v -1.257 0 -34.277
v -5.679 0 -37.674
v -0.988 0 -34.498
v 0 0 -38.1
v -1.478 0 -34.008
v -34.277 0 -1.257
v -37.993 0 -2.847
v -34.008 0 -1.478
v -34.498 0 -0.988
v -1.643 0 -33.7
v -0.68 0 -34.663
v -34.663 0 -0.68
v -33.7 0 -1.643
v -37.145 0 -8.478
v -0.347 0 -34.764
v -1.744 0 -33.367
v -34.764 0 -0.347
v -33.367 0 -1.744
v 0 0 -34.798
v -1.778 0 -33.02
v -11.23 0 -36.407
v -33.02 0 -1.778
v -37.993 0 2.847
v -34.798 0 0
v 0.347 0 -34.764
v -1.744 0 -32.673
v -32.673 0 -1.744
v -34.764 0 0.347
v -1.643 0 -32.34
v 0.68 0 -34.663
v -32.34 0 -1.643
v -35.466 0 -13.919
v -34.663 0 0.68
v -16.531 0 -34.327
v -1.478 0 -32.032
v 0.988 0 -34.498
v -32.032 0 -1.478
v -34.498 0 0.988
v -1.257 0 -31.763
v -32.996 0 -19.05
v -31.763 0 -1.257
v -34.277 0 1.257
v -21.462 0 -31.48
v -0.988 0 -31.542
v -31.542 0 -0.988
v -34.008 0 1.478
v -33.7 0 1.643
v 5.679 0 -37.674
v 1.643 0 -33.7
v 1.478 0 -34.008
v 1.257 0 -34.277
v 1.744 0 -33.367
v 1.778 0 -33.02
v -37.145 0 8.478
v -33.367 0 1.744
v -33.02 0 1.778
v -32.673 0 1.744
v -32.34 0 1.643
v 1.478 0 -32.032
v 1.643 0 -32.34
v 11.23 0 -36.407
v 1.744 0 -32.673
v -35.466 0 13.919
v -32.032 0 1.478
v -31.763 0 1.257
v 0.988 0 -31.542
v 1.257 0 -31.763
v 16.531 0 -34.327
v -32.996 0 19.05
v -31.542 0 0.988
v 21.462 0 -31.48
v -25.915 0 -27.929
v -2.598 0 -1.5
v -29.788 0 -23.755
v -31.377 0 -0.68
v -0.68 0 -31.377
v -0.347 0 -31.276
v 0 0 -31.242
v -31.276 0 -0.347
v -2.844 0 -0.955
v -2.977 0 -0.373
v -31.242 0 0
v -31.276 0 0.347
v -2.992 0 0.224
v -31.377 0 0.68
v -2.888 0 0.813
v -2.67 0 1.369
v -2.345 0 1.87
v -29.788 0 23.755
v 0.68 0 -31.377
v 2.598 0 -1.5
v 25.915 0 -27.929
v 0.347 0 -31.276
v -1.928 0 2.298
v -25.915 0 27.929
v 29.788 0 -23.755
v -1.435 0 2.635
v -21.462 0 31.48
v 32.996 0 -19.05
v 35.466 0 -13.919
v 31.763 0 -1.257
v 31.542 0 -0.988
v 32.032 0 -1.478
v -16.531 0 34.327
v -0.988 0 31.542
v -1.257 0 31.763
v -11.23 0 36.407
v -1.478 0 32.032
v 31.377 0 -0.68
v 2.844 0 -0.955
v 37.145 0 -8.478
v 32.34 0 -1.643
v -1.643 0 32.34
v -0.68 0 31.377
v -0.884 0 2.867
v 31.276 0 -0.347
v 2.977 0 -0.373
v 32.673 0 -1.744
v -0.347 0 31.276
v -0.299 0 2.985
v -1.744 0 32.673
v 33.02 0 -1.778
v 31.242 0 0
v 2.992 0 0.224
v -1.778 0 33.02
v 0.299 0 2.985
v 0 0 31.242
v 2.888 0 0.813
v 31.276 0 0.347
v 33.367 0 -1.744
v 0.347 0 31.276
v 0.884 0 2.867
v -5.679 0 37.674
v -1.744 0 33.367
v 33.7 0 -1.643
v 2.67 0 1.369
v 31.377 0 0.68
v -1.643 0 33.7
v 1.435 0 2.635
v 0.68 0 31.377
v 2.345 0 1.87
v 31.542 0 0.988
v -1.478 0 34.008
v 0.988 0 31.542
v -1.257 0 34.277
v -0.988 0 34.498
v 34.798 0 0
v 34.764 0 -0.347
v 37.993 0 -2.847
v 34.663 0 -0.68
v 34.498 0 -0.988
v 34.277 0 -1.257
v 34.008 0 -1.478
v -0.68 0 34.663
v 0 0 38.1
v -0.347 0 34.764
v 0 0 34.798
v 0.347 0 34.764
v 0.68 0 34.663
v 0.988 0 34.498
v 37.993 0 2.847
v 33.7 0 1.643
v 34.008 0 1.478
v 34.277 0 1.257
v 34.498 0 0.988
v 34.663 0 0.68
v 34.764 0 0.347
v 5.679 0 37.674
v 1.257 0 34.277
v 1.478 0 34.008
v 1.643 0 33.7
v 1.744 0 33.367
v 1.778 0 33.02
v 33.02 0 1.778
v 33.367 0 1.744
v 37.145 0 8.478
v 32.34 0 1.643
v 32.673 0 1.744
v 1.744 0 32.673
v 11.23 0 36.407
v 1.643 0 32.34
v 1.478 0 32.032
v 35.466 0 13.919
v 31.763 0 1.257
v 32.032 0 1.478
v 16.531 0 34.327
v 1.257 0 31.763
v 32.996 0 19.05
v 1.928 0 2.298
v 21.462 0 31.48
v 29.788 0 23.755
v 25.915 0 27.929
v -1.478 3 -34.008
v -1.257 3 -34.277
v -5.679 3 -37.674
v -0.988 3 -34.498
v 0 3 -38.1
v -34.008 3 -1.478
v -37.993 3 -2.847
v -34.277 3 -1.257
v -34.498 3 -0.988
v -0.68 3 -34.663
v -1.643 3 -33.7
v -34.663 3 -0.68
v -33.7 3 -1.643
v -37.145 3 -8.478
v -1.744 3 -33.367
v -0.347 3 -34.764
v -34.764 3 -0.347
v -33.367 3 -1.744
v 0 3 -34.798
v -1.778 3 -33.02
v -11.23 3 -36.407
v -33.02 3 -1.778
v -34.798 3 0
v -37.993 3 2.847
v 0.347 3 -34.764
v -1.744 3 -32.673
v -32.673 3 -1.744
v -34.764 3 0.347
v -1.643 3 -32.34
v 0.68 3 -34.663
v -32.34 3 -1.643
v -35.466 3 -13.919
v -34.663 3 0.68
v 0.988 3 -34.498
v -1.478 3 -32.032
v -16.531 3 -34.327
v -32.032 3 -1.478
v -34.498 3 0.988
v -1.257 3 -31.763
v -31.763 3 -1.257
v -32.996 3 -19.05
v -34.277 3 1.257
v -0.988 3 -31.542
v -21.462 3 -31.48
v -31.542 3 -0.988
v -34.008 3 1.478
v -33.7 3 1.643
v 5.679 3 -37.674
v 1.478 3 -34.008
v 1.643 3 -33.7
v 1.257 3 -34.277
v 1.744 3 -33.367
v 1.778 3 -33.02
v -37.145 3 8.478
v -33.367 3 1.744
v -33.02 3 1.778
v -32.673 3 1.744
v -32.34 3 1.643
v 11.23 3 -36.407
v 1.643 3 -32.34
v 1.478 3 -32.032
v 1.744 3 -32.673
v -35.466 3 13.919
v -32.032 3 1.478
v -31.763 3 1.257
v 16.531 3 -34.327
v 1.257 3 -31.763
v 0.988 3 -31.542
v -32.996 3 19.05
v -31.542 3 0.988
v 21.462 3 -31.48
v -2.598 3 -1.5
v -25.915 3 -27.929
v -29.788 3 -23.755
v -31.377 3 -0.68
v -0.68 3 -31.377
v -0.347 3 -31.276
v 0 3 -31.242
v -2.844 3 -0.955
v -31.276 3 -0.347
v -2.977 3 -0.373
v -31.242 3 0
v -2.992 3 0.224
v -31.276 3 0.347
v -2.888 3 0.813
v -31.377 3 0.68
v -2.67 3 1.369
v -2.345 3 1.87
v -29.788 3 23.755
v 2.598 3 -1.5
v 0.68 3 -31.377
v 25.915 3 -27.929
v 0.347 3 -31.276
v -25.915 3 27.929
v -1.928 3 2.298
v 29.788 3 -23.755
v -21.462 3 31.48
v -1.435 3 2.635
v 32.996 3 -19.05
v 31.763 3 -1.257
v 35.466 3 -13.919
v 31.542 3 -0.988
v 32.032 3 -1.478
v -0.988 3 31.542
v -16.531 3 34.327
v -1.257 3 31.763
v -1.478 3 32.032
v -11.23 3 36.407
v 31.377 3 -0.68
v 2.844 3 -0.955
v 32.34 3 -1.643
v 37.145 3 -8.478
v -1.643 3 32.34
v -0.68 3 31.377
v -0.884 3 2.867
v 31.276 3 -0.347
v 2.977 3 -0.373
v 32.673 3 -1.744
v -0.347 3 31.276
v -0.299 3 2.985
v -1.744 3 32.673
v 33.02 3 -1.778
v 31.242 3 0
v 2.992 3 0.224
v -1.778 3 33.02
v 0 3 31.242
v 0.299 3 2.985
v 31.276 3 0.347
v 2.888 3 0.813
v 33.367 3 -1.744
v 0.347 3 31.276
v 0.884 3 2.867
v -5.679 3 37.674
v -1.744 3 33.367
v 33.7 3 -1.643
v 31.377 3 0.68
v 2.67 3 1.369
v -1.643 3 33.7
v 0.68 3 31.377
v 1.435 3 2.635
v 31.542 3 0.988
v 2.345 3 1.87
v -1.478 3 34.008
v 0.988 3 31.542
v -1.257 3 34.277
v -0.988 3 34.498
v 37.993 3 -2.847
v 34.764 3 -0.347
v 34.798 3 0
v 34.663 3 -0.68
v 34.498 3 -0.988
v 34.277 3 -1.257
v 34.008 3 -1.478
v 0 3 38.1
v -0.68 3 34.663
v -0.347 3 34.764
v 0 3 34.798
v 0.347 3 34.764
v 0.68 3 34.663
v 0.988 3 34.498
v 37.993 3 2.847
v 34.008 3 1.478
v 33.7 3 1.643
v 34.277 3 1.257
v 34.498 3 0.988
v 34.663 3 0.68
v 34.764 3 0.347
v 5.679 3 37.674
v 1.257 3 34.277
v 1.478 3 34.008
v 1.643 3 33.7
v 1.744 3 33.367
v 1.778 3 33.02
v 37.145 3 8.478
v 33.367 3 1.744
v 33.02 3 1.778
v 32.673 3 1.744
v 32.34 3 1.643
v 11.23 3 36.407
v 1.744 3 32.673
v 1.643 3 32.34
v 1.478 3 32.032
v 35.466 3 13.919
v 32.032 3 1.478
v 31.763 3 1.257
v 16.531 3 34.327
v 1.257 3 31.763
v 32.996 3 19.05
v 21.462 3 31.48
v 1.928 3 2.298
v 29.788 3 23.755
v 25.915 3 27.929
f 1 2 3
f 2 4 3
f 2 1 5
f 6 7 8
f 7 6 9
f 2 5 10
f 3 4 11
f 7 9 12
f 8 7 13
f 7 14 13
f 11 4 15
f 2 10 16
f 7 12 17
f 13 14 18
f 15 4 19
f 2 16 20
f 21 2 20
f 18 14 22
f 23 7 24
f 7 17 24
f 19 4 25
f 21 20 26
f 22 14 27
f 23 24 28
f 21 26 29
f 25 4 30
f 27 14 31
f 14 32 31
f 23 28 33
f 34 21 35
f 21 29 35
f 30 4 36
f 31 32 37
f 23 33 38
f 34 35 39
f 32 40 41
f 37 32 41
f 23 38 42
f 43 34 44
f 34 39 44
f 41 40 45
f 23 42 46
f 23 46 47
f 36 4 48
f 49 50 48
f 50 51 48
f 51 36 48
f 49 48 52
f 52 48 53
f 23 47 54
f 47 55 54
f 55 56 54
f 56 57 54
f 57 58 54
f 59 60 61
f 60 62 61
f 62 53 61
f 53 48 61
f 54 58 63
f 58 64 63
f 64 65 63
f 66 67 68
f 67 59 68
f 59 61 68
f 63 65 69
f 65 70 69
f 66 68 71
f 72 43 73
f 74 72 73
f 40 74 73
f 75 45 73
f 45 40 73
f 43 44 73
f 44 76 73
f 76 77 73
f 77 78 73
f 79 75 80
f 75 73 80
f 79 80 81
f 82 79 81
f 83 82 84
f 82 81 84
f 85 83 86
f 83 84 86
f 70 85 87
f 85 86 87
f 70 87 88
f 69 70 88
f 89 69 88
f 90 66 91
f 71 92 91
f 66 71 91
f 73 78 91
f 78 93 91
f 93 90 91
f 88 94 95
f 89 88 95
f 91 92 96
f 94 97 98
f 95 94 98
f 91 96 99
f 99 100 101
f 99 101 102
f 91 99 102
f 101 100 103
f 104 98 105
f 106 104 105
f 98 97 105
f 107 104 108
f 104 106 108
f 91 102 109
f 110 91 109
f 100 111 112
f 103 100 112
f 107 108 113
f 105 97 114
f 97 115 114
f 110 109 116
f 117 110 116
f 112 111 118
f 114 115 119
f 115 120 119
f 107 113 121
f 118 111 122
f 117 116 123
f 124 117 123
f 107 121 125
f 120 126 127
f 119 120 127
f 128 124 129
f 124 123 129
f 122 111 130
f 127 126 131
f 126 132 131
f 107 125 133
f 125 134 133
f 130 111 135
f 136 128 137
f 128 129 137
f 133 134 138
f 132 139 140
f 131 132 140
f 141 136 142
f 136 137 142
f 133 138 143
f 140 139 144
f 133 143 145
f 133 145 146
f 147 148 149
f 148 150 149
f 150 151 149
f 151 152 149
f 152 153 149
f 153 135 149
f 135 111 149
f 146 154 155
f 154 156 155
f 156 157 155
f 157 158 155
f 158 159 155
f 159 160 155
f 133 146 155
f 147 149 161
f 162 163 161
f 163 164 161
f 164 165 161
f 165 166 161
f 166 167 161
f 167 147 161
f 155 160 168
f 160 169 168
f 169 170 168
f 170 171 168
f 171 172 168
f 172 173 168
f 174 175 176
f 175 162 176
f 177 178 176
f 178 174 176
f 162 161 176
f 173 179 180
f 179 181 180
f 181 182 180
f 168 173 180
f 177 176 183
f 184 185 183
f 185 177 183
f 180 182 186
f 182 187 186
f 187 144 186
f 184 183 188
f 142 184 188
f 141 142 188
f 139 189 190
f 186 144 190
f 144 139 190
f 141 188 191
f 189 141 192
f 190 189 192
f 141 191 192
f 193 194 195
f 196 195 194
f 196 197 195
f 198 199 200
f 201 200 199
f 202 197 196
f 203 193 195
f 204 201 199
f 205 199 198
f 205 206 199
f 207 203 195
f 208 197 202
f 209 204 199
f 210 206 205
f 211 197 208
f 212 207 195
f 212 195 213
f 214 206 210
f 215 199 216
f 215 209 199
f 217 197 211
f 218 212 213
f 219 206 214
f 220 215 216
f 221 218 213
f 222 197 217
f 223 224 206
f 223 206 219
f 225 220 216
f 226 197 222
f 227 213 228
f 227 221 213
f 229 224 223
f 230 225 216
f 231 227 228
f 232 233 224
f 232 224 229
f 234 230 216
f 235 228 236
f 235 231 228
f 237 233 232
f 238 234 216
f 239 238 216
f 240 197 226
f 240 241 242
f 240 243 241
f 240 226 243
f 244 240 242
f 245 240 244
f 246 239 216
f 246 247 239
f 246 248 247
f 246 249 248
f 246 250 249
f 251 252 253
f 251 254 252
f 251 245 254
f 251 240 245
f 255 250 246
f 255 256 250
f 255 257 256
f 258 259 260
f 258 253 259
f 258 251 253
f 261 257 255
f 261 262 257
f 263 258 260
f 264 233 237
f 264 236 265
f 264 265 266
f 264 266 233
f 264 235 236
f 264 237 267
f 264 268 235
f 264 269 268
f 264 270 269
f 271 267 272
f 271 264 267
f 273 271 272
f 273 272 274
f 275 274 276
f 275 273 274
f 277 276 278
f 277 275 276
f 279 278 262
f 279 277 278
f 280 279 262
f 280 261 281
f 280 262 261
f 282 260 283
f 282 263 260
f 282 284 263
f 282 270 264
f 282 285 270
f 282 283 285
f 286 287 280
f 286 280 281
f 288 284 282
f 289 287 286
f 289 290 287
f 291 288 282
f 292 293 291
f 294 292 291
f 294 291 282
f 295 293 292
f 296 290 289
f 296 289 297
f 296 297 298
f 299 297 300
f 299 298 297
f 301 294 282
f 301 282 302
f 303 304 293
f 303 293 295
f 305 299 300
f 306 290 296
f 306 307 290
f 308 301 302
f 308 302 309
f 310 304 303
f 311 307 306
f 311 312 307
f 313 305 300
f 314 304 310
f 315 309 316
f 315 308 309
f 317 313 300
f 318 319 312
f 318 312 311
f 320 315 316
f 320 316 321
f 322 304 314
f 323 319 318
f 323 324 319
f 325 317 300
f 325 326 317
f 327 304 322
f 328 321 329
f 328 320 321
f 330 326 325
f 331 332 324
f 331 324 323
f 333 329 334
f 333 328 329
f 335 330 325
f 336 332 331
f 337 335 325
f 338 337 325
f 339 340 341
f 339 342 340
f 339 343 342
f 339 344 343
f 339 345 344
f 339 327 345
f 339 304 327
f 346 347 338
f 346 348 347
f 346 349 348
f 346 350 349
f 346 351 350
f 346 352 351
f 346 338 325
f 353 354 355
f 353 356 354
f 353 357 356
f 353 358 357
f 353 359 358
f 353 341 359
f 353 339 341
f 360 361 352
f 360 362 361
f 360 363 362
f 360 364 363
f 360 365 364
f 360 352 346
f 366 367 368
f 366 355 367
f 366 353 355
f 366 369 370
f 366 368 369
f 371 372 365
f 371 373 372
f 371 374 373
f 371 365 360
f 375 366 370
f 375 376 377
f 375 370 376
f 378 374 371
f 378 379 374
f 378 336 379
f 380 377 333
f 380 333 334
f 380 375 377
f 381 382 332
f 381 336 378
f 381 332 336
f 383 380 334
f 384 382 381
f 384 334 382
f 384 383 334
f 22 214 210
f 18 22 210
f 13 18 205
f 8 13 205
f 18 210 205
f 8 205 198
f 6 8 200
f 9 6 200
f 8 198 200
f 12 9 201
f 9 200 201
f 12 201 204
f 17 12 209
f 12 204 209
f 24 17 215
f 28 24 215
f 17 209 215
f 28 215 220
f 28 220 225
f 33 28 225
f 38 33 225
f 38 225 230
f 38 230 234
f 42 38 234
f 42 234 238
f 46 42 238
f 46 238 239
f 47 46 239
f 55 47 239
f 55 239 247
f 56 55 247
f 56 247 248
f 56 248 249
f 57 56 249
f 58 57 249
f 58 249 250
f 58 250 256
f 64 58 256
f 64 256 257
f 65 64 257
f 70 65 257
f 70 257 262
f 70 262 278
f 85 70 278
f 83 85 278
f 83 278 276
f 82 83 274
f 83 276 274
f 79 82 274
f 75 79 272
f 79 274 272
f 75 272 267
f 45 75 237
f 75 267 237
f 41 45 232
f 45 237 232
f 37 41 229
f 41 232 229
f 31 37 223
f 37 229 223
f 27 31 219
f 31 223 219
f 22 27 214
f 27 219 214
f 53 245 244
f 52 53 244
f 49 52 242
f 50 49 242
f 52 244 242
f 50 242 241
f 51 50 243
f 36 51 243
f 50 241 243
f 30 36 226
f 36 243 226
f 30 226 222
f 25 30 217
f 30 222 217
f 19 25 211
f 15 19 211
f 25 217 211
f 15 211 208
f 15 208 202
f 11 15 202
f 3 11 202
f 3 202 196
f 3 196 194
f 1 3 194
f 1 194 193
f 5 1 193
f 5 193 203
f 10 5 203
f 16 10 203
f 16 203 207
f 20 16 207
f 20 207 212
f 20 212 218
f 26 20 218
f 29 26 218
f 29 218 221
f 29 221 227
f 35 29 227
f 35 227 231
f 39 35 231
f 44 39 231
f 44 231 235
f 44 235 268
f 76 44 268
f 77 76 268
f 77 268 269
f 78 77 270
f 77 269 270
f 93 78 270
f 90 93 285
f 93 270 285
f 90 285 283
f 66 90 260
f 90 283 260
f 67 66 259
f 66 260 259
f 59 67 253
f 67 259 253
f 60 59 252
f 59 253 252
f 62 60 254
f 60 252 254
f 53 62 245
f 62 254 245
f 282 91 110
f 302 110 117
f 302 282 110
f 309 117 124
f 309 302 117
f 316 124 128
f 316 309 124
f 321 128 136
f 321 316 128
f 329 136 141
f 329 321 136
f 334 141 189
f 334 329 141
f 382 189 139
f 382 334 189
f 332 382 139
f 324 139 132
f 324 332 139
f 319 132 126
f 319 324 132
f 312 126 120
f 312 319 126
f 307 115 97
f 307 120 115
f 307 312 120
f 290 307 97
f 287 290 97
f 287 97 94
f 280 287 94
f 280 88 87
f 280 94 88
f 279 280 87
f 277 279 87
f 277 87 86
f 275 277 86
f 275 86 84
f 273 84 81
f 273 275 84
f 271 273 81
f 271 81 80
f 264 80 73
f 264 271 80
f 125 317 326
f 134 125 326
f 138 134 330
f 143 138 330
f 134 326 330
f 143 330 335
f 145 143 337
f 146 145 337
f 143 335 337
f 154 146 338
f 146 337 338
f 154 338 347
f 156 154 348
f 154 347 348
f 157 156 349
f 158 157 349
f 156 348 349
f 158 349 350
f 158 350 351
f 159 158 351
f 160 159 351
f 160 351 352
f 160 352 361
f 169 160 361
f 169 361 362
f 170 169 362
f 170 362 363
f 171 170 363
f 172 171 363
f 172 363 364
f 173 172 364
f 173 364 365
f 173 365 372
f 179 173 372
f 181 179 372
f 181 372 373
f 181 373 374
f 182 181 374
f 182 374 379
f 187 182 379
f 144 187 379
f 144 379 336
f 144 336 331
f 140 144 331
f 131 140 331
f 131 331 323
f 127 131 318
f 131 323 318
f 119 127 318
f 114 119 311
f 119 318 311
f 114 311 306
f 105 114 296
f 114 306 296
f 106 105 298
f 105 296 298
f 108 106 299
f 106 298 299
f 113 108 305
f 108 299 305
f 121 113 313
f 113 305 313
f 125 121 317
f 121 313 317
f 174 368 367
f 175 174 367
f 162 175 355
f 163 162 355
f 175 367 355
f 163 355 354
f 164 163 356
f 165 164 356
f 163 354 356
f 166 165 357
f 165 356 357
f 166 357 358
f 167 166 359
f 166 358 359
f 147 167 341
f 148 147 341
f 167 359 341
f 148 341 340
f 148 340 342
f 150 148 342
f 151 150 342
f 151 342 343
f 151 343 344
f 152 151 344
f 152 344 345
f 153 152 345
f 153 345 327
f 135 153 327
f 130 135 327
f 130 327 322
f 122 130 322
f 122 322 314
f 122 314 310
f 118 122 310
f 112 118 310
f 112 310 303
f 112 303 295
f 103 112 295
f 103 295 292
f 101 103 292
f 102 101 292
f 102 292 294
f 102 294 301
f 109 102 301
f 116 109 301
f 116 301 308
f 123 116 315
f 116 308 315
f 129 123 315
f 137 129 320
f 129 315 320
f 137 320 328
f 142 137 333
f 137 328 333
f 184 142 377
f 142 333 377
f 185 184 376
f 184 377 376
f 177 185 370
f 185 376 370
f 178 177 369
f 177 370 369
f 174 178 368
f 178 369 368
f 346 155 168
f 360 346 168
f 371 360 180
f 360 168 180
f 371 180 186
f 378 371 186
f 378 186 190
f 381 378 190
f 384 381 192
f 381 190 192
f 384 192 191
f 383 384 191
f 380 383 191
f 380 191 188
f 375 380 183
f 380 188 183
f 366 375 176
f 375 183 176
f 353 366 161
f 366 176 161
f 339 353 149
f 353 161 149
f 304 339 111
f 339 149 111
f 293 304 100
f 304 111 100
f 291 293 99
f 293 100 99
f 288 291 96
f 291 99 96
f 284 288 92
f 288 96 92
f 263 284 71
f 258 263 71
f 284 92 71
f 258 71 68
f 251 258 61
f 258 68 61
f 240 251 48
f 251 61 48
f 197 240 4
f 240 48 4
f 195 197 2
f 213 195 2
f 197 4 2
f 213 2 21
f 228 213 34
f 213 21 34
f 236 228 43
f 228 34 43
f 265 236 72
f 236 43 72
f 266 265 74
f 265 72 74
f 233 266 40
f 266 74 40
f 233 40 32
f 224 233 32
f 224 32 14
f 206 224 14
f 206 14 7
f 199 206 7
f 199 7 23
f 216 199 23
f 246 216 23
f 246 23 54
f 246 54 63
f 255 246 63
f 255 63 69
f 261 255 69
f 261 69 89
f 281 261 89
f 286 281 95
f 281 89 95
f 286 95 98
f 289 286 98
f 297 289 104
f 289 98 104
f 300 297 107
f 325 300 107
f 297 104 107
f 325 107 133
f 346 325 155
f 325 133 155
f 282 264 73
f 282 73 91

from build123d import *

# Parameters (mm, degrees)
SKETCH1_R           = 38.1
BOSS_EXTRUDE1_DEPTH = 3
SKETCH3_R           = 1.778
CUT_EXTRUDE1_DEPTH  = 54.96498865
CIRPATTERN1_COUNT   = 4
CUT_EXTRUDE2_DEPTH  = 54.96498865


with BuildPart() as part:
    # Sketch1 → Boss-Extrude1 (new body)
    with BuildSketch(Plane(origin=(0, 0, 0), x_dir=(1, 0, 0), z_dir=(0, 1, 0))):
        with Locations(Location((0, 0, 0), (0, 0, 270))):
            Circle(SKETCH1_R)
    extrude(amount=BOSS_EXTRUDE1_DEPTH)

    # Sketch3 → Cut-Extrude1 (cut, through all)
    with BuildSketch(Plane(origin=(0, 3, 0), x_dir=(1, 0, 0), z_dir=(0, 1, 0))):
        with Locations(Location((33.02, 0, 0), (0, 0, 270))):
            Circle(SKETCH3_R)
    cut_extrude1 = extrude(amount=-CUT_EXTRUDE1_DEPTH, mode=Mode.SUBTRACT)

    # CirPattern1: Cut-Extrude1 ×4 about axis
    cirpattern1_axis = Axis((0, 0, 0), (0, 1, 0))
    for i in range(1, CIRPATTERN1_COUNT):
        add(cut_extrude1.rotate(cirpattern1_axis, i * 360 / CIRPATTERN1_COUNT), mode=Mode.SUBTRACT)

    # Sketch4 → Cut-Extrude2 (cut, through all)
    with BuildSketch(Plane(origin=(0, 3, 0), x_dir=(1, 0, 0), z_dir=(0, 1, 0))):
        with BuildLine():
            Line((-2.598076211, 1.5), (2.598076211, 1.5))
            ThreePointArc((2.598076211, 1.5), (0, -3), (-2.598076211, 1.5))
        make_face()
    extrude(amount=-CUT_EXTRUDE2_DEPTH, mode=Mode.SUBTRACT)


solid = part.part
